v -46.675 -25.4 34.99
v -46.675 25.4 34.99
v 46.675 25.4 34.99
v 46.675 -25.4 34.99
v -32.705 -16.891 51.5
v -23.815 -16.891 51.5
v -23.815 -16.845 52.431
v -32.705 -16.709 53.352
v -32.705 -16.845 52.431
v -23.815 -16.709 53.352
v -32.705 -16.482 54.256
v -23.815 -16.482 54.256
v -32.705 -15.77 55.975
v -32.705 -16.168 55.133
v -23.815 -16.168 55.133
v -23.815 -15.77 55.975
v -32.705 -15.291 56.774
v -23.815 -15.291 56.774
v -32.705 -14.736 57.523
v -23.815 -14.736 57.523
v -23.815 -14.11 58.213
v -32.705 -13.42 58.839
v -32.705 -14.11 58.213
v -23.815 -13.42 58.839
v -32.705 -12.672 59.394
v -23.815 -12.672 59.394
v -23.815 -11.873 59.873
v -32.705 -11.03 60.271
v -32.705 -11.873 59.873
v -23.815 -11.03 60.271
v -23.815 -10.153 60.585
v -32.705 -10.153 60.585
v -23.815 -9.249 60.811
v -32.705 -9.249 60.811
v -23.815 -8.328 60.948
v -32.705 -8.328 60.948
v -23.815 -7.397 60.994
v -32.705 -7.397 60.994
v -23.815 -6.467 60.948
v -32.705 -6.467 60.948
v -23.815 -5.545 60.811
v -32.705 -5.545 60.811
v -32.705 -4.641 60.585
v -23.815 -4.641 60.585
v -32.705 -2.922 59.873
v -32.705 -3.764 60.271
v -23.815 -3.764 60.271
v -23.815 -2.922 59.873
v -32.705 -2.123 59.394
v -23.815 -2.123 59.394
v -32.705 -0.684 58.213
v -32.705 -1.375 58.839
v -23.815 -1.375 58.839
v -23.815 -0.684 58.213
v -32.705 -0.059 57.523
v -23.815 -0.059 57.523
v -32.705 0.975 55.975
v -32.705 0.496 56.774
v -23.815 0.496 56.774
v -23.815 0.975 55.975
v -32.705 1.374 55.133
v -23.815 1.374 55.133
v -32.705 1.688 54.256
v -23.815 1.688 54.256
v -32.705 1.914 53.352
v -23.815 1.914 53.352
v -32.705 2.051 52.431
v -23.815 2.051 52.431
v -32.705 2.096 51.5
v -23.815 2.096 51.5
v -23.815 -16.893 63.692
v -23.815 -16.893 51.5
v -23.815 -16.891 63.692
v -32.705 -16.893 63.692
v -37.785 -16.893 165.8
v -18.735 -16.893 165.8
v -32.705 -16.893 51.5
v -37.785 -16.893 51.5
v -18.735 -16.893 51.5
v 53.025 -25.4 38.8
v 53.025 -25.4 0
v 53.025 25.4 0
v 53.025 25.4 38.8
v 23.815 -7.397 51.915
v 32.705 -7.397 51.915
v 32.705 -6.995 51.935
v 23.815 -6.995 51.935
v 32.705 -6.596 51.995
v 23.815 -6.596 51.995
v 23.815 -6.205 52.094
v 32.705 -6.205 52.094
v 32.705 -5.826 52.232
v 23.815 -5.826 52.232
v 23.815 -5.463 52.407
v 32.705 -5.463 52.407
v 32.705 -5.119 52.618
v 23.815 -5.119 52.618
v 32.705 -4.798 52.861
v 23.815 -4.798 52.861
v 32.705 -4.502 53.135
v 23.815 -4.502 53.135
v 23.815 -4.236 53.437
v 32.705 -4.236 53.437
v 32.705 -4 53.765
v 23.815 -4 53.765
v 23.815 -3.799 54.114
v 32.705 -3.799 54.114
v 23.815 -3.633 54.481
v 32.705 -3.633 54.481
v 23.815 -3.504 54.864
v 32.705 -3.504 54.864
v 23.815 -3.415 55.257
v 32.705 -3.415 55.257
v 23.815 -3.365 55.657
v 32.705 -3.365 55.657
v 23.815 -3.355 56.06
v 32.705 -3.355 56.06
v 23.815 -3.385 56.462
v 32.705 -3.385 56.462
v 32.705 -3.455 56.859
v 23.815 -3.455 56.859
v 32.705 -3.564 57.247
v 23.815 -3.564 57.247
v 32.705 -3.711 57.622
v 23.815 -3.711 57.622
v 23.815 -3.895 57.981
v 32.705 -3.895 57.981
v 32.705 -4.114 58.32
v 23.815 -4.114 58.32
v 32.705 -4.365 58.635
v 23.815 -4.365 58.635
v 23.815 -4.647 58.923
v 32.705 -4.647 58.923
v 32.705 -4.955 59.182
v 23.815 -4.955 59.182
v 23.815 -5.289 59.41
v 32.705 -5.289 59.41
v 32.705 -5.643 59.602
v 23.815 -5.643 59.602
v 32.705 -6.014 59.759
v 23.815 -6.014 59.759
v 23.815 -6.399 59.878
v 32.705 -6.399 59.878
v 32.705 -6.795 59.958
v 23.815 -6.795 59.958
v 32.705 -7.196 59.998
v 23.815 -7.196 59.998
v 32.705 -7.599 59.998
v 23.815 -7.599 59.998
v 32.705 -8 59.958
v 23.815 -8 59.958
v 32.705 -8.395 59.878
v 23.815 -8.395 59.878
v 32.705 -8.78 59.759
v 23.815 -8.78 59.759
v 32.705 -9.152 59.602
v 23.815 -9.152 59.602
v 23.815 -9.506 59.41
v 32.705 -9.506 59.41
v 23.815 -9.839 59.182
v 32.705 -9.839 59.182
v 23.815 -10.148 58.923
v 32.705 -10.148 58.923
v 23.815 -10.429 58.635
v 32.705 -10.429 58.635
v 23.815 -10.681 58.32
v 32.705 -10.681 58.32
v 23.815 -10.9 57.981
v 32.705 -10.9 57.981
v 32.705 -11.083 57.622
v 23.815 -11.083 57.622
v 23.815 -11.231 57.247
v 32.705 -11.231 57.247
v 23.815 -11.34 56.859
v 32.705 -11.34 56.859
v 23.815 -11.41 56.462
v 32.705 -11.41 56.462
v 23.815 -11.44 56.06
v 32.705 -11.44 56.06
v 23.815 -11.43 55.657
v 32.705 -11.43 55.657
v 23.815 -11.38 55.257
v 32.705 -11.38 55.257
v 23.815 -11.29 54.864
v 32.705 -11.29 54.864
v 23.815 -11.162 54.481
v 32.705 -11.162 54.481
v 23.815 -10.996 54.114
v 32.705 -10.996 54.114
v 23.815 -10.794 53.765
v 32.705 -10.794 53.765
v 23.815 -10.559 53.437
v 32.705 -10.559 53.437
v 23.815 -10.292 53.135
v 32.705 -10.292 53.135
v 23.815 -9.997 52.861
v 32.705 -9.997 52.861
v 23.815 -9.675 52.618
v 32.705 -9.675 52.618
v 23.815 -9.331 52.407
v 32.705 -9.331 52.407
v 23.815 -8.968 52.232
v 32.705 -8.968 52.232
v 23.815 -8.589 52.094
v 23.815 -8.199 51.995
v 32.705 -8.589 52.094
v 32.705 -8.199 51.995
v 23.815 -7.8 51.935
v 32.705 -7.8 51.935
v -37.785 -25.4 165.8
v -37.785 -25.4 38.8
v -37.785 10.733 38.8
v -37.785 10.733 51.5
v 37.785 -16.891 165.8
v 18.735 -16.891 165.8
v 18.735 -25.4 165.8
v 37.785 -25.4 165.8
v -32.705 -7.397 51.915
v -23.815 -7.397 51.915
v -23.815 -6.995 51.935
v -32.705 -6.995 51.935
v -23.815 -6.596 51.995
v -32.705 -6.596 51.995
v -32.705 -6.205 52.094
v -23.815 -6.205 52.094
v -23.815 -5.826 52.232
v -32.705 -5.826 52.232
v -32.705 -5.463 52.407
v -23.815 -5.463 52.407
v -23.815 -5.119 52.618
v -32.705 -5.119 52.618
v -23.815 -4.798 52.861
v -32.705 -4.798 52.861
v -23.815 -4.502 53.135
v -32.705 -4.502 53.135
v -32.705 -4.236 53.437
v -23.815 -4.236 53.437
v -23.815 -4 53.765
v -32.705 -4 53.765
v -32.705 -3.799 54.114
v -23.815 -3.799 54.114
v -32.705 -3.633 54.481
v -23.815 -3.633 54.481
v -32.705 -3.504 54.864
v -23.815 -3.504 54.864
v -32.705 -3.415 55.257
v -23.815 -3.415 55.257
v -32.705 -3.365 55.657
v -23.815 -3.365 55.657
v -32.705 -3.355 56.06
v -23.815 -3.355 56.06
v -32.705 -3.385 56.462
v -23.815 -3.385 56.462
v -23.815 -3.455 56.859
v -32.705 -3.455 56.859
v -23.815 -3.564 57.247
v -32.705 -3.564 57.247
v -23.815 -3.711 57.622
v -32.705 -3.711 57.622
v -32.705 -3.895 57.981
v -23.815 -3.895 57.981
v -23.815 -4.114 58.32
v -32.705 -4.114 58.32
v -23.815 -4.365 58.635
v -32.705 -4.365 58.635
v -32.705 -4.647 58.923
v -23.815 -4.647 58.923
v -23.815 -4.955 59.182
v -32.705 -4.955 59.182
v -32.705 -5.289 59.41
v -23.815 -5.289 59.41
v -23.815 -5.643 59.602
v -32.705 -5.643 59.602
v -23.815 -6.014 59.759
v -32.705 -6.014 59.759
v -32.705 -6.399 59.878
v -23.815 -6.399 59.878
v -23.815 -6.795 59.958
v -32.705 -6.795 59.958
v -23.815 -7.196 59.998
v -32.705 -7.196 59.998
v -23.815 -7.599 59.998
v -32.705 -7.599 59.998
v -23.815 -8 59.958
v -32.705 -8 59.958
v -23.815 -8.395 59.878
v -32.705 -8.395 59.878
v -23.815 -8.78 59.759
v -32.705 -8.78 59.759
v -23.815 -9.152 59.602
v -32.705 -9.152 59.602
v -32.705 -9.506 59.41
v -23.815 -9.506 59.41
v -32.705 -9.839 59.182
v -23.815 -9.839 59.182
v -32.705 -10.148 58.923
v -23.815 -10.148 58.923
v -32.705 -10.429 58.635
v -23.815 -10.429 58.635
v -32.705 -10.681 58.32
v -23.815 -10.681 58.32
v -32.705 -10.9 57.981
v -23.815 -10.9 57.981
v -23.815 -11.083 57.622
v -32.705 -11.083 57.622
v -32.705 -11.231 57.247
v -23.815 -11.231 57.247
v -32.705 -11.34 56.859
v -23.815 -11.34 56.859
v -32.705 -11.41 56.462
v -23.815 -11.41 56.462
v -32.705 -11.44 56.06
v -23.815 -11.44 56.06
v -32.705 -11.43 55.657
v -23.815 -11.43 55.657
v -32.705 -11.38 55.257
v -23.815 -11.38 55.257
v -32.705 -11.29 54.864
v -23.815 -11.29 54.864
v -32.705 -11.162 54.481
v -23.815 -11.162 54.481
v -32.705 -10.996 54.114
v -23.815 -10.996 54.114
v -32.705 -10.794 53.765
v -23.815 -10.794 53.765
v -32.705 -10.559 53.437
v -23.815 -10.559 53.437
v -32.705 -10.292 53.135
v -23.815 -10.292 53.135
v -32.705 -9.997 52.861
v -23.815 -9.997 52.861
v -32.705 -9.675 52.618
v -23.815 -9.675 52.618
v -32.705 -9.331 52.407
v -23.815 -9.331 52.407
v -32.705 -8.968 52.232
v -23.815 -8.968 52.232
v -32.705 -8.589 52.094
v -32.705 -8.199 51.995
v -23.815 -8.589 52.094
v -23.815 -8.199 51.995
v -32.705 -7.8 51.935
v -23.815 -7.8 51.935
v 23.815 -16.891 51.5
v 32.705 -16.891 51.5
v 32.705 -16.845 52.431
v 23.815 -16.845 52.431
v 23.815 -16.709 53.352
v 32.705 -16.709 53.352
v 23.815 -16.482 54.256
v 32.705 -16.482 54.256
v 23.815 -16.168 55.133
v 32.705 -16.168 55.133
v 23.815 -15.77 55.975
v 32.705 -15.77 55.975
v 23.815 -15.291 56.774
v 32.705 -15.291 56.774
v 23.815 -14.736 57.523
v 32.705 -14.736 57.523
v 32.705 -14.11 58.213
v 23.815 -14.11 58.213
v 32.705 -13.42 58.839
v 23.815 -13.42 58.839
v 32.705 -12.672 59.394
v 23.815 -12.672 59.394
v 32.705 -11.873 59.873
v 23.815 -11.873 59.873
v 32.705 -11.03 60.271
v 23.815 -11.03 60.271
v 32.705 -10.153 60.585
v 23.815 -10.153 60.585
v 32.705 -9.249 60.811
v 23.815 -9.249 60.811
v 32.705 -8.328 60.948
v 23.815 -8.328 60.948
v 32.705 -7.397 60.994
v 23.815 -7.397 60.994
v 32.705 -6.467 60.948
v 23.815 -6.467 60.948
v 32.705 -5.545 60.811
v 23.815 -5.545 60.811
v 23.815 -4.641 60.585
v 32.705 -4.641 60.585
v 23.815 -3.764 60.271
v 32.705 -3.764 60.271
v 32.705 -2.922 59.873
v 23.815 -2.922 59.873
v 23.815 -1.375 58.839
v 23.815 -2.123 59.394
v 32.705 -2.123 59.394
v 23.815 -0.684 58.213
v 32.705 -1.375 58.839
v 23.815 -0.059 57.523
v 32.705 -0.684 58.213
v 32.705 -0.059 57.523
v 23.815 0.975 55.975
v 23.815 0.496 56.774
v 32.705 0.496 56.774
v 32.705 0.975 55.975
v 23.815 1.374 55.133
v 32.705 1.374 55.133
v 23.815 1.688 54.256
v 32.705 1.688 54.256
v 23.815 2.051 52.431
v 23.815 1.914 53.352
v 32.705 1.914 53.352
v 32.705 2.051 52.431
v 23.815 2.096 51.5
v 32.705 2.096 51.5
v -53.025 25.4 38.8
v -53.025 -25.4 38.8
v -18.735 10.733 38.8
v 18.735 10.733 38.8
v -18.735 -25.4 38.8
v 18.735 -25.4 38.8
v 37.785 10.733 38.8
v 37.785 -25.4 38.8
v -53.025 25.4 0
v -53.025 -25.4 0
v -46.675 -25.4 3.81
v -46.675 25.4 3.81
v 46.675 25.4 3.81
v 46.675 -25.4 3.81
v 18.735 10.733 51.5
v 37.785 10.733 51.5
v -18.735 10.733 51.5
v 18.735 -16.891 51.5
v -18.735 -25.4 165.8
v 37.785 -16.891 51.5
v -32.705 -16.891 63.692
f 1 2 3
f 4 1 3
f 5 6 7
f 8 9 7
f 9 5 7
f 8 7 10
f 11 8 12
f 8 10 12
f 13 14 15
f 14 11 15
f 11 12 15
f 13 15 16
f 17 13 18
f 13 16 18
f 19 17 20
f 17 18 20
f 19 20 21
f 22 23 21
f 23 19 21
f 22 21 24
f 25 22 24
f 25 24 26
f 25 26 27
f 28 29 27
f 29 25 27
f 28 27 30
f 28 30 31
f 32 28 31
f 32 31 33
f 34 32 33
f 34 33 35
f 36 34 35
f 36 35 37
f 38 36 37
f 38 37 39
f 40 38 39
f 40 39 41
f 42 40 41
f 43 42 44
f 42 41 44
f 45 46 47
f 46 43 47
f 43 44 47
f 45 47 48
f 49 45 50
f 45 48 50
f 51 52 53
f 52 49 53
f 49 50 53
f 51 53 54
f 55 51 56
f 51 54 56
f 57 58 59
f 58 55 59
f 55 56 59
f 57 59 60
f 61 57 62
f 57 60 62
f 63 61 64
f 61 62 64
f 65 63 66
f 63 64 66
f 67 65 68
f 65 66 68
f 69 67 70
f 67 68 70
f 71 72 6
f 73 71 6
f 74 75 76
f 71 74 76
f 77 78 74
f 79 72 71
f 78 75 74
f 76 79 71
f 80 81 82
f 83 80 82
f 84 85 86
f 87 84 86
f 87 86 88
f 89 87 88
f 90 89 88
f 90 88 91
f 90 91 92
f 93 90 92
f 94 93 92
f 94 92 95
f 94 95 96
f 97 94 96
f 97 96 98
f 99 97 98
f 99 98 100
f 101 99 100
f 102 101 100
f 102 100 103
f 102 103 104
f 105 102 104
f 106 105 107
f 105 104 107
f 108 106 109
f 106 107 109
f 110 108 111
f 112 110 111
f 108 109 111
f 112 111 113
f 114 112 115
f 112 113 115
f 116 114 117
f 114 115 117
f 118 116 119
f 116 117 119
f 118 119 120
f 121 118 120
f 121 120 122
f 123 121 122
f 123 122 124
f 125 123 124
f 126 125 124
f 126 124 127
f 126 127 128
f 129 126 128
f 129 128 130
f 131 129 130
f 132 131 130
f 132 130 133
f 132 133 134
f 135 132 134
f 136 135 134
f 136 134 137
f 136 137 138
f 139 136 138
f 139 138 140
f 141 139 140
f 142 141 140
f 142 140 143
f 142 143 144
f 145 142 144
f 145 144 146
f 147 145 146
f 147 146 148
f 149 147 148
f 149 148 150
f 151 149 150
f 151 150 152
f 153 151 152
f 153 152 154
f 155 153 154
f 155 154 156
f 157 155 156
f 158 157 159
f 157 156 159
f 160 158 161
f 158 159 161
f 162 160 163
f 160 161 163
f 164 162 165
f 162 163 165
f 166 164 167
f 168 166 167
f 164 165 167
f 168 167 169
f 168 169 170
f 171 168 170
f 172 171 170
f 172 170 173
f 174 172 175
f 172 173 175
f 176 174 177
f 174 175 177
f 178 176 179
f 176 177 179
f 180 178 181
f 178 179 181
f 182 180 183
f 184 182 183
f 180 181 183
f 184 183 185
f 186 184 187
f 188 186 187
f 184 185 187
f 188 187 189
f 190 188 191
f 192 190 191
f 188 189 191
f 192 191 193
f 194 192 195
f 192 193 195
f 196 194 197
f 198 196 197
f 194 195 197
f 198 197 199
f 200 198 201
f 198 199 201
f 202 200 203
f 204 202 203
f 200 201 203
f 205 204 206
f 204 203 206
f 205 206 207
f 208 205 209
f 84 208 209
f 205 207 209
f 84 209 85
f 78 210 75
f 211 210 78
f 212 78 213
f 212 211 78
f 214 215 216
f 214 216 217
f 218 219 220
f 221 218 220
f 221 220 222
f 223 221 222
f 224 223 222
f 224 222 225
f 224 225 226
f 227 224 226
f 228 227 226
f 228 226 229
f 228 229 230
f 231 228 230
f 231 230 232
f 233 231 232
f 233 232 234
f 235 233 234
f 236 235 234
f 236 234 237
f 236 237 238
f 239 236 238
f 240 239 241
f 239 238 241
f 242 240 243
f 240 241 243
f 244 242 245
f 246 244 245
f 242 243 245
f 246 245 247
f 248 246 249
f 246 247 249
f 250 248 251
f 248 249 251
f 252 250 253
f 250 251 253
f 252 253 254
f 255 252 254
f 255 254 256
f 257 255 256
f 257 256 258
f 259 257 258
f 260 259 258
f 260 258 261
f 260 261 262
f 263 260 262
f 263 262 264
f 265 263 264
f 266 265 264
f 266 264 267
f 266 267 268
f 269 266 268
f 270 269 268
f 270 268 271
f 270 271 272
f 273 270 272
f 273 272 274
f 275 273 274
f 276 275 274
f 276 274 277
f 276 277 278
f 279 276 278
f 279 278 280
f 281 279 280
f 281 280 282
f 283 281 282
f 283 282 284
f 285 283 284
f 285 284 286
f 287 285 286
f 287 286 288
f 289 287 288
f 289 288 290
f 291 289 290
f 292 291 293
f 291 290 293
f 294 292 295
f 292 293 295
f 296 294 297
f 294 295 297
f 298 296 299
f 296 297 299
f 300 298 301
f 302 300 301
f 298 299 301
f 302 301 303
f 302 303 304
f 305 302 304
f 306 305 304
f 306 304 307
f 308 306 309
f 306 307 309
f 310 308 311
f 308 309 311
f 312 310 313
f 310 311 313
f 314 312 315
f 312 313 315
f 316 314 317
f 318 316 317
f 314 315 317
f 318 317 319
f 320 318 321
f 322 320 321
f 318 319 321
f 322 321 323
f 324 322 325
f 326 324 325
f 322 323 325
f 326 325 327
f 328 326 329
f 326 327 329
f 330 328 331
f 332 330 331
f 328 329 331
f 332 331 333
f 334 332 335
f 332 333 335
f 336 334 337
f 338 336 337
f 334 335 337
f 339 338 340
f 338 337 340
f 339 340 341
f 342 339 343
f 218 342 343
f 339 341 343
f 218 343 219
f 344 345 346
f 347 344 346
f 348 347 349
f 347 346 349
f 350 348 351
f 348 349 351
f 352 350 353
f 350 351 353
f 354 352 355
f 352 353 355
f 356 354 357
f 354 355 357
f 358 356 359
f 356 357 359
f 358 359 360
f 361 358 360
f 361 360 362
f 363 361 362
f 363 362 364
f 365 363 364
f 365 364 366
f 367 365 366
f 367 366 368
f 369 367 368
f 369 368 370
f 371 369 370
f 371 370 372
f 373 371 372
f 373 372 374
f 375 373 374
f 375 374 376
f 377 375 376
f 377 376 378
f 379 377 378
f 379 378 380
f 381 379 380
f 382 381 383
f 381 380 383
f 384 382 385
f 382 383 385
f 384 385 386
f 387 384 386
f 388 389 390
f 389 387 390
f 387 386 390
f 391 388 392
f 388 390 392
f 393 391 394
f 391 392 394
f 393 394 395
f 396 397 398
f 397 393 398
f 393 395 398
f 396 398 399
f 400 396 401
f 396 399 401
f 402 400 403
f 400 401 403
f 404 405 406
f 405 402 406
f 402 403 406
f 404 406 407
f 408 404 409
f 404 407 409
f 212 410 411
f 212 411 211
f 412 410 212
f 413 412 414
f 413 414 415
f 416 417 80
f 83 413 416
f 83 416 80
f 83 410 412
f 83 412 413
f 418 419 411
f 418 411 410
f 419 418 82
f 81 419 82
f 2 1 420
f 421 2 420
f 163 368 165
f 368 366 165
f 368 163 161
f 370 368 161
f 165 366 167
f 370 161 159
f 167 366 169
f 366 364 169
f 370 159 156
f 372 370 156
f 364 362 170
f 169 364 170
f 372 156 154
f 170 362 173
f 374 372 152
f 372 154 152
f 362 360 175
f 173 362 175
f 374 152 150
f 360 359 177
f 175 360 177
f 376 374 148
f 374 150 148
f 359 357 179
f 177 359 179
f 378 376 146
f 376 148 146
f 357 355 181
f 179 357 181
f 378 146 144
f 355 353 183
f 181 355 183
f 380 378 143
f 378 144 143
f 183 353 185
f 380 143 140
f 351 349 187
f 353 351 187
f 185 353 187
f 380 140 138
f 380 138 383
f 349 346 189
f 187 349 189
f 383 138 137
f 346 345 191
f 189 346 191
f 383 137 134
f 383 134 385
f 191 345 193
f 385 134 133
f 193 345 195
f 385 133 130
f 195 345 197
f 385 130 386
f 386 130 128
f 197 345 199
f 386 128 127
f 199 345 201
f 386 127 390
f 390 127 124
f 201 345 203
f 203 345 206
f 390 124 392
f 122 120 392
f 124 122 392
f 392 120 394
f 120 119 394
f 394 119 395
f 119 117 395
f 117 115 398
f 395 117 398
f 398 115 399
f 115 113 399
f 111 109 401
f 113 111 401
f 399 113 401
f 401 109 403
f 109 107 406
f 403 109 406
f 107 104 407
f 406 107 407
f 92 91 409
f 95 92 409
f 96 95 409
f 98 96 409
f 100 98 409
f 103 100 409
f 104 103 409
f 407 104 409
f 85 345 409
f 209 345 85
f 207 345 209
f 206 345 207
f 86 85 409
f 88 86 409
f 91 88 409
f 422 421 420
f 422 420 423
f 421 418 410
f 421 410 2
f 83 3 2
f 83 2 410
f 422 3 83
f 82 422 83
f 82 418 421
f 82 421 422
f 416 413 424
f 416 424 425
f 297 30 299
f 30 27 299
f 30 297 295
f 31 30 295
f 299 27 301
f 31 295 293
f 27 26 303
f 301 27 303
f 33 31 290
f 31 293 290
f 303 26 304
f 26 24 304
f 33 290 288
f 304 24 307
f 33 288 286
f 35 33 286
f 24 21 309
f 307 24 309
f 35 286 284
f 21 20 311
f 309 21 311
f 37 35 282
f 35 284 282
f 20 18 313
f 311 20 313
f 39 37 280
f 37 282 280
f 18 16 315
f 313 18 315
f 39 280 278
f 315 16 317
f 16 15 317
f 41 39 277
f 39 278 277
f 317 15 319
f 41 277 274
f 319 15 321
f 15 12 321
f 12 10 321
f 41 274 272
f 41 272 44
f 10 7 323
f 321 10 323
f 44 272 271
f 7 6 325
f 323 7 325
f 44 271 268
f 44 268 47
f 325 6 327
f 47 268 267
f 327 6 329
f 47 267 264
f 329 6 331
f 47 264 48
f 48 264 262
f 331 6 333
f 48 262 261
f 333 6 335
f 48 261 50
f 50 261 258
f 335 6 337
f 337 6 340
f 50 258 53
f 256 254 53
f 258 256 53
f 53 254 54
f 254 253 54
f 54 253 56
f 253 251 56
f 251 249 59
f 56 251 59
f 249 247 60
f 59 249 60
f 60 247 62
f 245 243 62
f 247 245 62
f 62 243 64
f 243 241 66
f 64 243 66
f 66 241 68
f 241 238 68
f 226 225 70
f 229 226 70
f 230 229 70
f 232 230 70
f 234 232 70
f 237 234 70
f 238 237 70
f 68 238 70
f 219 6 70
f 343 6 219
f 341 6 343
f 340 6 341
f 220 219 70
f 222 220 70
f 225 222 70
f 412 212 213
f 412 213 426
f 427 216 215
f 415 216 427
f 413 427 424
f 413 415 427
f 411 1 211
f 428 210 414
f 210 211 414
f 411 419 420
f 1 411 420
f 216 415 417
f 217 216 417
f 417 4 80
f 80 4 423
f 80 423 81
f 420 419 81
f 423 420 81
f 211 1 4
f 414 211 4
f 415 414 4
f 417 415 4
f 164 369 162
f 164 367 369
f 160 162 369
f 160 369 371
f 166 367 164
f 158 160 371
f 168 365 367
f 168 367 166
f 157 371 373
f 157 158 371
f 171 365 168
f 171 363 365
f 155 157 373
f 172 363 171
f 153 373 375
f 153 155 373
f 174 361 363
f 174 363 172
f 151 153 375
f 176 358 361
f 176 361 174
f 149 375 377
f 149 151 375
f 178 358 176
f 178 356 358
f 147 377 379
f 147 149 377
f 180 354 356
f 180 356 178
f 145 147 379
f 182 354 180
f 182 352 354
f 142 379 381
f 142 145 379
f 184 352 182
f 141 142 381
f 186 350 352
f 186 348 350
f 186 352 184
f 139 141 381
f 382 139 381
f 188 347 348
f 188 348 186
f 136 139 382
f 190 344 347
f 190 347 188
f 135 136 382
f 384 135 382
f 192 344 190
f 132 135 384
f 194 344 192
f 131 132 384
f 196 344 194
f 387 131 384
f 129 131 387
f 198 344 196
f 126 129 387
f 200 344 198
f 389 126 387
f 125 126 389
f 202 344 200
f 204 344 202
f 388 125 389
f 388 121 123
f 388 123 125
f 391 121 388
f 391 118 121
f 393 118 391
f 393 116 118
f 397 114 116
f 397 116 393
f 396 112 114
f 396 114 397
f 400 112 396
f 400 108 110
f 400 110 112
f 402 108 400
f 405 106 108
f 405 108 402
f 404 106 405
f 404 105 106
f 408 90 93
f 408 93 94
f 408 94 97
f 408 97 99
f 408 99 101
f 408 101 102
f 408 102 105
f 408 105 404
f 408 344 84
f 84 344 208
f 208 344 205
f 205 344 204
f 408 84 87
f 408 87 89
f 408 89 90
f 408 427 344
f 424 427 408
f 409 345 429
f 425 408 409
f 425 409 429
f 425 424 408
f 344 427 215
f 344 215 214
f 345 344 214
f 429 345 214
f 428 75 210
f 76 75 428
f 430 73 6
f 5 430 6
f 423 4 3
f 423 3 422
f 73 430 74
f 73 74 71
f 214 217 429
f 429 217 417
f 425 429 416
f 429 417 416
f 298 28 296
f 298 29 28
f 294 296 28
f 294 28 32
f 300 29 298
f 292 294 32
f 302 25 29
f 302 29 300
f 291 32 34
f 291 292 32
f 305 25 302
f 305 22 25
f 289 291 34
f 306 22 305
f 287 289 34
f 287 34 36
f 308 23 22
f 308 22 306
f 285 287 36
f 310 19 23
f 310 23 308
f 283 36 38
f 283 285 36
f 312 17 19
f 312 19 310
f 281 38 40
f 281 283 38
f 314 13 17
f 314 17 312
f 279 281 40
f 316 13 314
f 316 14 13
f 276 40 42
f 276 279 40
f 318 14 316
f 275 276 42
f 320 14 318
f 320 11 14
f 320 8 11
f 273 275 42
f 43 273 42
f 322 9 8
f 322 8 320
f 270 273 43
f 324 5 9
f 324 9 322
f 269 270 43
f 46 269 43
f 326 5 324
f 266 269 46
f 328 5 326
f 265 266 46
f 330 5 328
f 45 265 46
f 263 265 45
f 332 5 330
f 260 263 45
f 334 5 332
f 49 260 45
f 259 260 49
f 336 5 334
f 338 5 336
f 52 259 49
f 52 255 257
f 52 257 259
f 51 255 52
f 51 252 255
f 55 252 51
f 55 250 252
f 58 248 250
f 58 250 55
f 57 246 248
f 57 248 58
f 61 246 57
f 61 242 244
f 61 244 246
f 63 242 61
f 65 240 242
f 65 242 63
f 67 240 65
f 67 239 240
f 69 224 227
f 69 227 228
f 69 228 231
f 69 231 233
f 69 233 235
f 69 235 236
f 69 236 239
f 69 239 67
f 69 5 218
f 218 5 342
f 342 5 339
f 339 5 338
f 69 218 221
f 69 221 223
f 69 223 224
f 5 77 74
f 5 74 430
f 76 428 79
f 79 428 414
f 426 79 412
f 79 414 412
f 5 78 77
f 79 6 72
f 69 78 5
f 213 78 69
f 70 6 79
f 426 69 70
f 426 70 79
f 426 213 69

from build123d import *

# Parameters (mm, degrees)
SKETCH1_W           = 106.04999999
SKETCH1_H           = 50.8
BOSS_EXTRUDE1_DEPTH = 38.800000124
SKETCH3_W           = 93.34999999
SKETCH3_H           = 31.180000124
CUT_EXTRUDE1_DEPTH  = 64.516
BOSS_EXTRUDE2_DEPTH = 12.7
SKETCH8_W           = 19.05
SKETCH8_H           = 8.507235526
SKETCH8_H_2         = 8.509
BOSS_EXTRUDE3_DEPTH = 114.3
SKETCH9_W           = 19.05
SKETCH9_H           = 19.119005999
SKETCH9_H_2         = 19.115477052
BOSS_EXTRUDE4_DEPTH = 12.7
SKETCH10_W          = 8.89
SKETCH10_H          = 18.989146711
SKETCH10_H_2        = 18.987382237
BOSS_EXTRUDE5_DEPTH = 12.192
CUT_EXTRUDE7_DEPTH  = 78.232
SKETCH13_R          = 4.044043228
CUT_EXTRUDE9_DEPTH  = 83.82


with BuildPart() as part:
    # Sketch1 → Boss-Extrude1 (new body)
    with BuildSketch(Plane.XY):
        Rectangle(SKETCH1_W, SKETCH1_H)
    extrude(amount=BOSS_EXTRUDE1_DEPTH)

    # Sketch3 → Cut-Extrude1 (cut)
    with BuildSketch(Plane(origin=(0, 25.4, 0), x_dir=(1, 0, 0), z_dir=(0, 1, 0))):
        with Locations((0, -19.400000062)):
            Rectangle(SKETCH3_W, SKETCH3_H)
    extrude(amount=-CUT_EXTRUDE1_DEPTH, mode=Mode.SUBTRACT)

    # Sketch7 → Boss-Extrude2 (add)
    with BuildSketch(Plane.XY.offset(38.800000124)):
        Polygon((-37.784999995, -21.634664683), (-37.784999995, -25.4), (-18.734999995, -25.4), (-18.734999995, -21.634664683), (-18.734999995, -8.385528947), (-37.784999995, -8.385528947), align=None)
        Polygon((18.734999995, -21.634664683), (18.734999995, -25.4), (37.784999995, -25.4), (37.784999995, -21.634664683), (37.784999995, -8.382), (18.734999995, -8.382), align=None)
    extrude(amount=BOSS_EXTRUDE2_DEPTH)

    # Sketch8 → Boss-Extrude3 (add)
    with BuildSketch(Plane.XY.offset(51.500000124)):
        with Locations((-28.259999995, -21.146382237)):
            Rectangle(SKETCH8_W, SKETCH8_H)
        with Locations((28.259999995, -21.1455)):
            Rectangle(SKETCH8_W, SKETCH8_H_2)
    extrude(amount=BOSS_EXTRUDE3_DEPTH)

    # Sketch9 → Boss-Extrude4 (add)
    with BuildSketch(Plane.XY.offset(38.800000124)):
        with Locations((-28.259999995, 1.173974053)):
            Rectangle(SKETCH9_W, SKETCH9_H)
        with Locations((28.259999995, 1.175738526)):
            Rectangle(SKETCH9_W, SKETCH9_H_2)
    extrude(amount=BOSS_EXTRUDE4_DEPTH)

    # Sketch10 → Boss-Extrude5 (add)
    with BuildSketch(Plane.XY.offset(51.500000124)):
        with Locations((-28.259999995, -7.398191118)):
            Rectangle(SKETCH10_W, SKETCH10_H)
        with Locations((28.259999995, -7.397308882)):
            Rectangle(SKETCH10_W, SKETCH10_H_2)
    extrude(amount=BOSS_EXTRUDE5_DEPTH)

    # Sketch11 → Cut-Extrude7 (cut)
    with BuildSketch(Plane(origin=(32.704999995, 0, 0), x_dir=(0, 0, -1), z_dir=(1, 0, 0))):
        with BuildLine():
            ThreePointArc((-51.500000124, -16.891), (-60.993691242, -7.397308882), (-51.500000124, 2.096382237))
            Line((-51.500000124, 2.096382237), (-63.692000124, 2.096382237))
            Line((-63.692000124, 2.096382237), (-63.692000124, -16.891))
            Line((-63.692000124, -16.891), (-51.500000124, -16.891))
        make_face()
    extrude(amount=-CUT_EXTRUDE7_DEPTH, mode=Mode.SUBTRACT)

    # Sketch13 → Cut-Extrude9 (cut)
    with BuildSketch(Plane(origin=(32.704999995, 0, 0), x_dir=(0, 0, -1), z_dir=(1, 0, 0))):
        with Locations((-55.958857725, -7.397308882)):
            Circle(SKETCH13_R)
    extrude(amount=-CUT_EXTRUDE9_DEPTH, mode=Mode.SUBTRACT)


solid = part.part
